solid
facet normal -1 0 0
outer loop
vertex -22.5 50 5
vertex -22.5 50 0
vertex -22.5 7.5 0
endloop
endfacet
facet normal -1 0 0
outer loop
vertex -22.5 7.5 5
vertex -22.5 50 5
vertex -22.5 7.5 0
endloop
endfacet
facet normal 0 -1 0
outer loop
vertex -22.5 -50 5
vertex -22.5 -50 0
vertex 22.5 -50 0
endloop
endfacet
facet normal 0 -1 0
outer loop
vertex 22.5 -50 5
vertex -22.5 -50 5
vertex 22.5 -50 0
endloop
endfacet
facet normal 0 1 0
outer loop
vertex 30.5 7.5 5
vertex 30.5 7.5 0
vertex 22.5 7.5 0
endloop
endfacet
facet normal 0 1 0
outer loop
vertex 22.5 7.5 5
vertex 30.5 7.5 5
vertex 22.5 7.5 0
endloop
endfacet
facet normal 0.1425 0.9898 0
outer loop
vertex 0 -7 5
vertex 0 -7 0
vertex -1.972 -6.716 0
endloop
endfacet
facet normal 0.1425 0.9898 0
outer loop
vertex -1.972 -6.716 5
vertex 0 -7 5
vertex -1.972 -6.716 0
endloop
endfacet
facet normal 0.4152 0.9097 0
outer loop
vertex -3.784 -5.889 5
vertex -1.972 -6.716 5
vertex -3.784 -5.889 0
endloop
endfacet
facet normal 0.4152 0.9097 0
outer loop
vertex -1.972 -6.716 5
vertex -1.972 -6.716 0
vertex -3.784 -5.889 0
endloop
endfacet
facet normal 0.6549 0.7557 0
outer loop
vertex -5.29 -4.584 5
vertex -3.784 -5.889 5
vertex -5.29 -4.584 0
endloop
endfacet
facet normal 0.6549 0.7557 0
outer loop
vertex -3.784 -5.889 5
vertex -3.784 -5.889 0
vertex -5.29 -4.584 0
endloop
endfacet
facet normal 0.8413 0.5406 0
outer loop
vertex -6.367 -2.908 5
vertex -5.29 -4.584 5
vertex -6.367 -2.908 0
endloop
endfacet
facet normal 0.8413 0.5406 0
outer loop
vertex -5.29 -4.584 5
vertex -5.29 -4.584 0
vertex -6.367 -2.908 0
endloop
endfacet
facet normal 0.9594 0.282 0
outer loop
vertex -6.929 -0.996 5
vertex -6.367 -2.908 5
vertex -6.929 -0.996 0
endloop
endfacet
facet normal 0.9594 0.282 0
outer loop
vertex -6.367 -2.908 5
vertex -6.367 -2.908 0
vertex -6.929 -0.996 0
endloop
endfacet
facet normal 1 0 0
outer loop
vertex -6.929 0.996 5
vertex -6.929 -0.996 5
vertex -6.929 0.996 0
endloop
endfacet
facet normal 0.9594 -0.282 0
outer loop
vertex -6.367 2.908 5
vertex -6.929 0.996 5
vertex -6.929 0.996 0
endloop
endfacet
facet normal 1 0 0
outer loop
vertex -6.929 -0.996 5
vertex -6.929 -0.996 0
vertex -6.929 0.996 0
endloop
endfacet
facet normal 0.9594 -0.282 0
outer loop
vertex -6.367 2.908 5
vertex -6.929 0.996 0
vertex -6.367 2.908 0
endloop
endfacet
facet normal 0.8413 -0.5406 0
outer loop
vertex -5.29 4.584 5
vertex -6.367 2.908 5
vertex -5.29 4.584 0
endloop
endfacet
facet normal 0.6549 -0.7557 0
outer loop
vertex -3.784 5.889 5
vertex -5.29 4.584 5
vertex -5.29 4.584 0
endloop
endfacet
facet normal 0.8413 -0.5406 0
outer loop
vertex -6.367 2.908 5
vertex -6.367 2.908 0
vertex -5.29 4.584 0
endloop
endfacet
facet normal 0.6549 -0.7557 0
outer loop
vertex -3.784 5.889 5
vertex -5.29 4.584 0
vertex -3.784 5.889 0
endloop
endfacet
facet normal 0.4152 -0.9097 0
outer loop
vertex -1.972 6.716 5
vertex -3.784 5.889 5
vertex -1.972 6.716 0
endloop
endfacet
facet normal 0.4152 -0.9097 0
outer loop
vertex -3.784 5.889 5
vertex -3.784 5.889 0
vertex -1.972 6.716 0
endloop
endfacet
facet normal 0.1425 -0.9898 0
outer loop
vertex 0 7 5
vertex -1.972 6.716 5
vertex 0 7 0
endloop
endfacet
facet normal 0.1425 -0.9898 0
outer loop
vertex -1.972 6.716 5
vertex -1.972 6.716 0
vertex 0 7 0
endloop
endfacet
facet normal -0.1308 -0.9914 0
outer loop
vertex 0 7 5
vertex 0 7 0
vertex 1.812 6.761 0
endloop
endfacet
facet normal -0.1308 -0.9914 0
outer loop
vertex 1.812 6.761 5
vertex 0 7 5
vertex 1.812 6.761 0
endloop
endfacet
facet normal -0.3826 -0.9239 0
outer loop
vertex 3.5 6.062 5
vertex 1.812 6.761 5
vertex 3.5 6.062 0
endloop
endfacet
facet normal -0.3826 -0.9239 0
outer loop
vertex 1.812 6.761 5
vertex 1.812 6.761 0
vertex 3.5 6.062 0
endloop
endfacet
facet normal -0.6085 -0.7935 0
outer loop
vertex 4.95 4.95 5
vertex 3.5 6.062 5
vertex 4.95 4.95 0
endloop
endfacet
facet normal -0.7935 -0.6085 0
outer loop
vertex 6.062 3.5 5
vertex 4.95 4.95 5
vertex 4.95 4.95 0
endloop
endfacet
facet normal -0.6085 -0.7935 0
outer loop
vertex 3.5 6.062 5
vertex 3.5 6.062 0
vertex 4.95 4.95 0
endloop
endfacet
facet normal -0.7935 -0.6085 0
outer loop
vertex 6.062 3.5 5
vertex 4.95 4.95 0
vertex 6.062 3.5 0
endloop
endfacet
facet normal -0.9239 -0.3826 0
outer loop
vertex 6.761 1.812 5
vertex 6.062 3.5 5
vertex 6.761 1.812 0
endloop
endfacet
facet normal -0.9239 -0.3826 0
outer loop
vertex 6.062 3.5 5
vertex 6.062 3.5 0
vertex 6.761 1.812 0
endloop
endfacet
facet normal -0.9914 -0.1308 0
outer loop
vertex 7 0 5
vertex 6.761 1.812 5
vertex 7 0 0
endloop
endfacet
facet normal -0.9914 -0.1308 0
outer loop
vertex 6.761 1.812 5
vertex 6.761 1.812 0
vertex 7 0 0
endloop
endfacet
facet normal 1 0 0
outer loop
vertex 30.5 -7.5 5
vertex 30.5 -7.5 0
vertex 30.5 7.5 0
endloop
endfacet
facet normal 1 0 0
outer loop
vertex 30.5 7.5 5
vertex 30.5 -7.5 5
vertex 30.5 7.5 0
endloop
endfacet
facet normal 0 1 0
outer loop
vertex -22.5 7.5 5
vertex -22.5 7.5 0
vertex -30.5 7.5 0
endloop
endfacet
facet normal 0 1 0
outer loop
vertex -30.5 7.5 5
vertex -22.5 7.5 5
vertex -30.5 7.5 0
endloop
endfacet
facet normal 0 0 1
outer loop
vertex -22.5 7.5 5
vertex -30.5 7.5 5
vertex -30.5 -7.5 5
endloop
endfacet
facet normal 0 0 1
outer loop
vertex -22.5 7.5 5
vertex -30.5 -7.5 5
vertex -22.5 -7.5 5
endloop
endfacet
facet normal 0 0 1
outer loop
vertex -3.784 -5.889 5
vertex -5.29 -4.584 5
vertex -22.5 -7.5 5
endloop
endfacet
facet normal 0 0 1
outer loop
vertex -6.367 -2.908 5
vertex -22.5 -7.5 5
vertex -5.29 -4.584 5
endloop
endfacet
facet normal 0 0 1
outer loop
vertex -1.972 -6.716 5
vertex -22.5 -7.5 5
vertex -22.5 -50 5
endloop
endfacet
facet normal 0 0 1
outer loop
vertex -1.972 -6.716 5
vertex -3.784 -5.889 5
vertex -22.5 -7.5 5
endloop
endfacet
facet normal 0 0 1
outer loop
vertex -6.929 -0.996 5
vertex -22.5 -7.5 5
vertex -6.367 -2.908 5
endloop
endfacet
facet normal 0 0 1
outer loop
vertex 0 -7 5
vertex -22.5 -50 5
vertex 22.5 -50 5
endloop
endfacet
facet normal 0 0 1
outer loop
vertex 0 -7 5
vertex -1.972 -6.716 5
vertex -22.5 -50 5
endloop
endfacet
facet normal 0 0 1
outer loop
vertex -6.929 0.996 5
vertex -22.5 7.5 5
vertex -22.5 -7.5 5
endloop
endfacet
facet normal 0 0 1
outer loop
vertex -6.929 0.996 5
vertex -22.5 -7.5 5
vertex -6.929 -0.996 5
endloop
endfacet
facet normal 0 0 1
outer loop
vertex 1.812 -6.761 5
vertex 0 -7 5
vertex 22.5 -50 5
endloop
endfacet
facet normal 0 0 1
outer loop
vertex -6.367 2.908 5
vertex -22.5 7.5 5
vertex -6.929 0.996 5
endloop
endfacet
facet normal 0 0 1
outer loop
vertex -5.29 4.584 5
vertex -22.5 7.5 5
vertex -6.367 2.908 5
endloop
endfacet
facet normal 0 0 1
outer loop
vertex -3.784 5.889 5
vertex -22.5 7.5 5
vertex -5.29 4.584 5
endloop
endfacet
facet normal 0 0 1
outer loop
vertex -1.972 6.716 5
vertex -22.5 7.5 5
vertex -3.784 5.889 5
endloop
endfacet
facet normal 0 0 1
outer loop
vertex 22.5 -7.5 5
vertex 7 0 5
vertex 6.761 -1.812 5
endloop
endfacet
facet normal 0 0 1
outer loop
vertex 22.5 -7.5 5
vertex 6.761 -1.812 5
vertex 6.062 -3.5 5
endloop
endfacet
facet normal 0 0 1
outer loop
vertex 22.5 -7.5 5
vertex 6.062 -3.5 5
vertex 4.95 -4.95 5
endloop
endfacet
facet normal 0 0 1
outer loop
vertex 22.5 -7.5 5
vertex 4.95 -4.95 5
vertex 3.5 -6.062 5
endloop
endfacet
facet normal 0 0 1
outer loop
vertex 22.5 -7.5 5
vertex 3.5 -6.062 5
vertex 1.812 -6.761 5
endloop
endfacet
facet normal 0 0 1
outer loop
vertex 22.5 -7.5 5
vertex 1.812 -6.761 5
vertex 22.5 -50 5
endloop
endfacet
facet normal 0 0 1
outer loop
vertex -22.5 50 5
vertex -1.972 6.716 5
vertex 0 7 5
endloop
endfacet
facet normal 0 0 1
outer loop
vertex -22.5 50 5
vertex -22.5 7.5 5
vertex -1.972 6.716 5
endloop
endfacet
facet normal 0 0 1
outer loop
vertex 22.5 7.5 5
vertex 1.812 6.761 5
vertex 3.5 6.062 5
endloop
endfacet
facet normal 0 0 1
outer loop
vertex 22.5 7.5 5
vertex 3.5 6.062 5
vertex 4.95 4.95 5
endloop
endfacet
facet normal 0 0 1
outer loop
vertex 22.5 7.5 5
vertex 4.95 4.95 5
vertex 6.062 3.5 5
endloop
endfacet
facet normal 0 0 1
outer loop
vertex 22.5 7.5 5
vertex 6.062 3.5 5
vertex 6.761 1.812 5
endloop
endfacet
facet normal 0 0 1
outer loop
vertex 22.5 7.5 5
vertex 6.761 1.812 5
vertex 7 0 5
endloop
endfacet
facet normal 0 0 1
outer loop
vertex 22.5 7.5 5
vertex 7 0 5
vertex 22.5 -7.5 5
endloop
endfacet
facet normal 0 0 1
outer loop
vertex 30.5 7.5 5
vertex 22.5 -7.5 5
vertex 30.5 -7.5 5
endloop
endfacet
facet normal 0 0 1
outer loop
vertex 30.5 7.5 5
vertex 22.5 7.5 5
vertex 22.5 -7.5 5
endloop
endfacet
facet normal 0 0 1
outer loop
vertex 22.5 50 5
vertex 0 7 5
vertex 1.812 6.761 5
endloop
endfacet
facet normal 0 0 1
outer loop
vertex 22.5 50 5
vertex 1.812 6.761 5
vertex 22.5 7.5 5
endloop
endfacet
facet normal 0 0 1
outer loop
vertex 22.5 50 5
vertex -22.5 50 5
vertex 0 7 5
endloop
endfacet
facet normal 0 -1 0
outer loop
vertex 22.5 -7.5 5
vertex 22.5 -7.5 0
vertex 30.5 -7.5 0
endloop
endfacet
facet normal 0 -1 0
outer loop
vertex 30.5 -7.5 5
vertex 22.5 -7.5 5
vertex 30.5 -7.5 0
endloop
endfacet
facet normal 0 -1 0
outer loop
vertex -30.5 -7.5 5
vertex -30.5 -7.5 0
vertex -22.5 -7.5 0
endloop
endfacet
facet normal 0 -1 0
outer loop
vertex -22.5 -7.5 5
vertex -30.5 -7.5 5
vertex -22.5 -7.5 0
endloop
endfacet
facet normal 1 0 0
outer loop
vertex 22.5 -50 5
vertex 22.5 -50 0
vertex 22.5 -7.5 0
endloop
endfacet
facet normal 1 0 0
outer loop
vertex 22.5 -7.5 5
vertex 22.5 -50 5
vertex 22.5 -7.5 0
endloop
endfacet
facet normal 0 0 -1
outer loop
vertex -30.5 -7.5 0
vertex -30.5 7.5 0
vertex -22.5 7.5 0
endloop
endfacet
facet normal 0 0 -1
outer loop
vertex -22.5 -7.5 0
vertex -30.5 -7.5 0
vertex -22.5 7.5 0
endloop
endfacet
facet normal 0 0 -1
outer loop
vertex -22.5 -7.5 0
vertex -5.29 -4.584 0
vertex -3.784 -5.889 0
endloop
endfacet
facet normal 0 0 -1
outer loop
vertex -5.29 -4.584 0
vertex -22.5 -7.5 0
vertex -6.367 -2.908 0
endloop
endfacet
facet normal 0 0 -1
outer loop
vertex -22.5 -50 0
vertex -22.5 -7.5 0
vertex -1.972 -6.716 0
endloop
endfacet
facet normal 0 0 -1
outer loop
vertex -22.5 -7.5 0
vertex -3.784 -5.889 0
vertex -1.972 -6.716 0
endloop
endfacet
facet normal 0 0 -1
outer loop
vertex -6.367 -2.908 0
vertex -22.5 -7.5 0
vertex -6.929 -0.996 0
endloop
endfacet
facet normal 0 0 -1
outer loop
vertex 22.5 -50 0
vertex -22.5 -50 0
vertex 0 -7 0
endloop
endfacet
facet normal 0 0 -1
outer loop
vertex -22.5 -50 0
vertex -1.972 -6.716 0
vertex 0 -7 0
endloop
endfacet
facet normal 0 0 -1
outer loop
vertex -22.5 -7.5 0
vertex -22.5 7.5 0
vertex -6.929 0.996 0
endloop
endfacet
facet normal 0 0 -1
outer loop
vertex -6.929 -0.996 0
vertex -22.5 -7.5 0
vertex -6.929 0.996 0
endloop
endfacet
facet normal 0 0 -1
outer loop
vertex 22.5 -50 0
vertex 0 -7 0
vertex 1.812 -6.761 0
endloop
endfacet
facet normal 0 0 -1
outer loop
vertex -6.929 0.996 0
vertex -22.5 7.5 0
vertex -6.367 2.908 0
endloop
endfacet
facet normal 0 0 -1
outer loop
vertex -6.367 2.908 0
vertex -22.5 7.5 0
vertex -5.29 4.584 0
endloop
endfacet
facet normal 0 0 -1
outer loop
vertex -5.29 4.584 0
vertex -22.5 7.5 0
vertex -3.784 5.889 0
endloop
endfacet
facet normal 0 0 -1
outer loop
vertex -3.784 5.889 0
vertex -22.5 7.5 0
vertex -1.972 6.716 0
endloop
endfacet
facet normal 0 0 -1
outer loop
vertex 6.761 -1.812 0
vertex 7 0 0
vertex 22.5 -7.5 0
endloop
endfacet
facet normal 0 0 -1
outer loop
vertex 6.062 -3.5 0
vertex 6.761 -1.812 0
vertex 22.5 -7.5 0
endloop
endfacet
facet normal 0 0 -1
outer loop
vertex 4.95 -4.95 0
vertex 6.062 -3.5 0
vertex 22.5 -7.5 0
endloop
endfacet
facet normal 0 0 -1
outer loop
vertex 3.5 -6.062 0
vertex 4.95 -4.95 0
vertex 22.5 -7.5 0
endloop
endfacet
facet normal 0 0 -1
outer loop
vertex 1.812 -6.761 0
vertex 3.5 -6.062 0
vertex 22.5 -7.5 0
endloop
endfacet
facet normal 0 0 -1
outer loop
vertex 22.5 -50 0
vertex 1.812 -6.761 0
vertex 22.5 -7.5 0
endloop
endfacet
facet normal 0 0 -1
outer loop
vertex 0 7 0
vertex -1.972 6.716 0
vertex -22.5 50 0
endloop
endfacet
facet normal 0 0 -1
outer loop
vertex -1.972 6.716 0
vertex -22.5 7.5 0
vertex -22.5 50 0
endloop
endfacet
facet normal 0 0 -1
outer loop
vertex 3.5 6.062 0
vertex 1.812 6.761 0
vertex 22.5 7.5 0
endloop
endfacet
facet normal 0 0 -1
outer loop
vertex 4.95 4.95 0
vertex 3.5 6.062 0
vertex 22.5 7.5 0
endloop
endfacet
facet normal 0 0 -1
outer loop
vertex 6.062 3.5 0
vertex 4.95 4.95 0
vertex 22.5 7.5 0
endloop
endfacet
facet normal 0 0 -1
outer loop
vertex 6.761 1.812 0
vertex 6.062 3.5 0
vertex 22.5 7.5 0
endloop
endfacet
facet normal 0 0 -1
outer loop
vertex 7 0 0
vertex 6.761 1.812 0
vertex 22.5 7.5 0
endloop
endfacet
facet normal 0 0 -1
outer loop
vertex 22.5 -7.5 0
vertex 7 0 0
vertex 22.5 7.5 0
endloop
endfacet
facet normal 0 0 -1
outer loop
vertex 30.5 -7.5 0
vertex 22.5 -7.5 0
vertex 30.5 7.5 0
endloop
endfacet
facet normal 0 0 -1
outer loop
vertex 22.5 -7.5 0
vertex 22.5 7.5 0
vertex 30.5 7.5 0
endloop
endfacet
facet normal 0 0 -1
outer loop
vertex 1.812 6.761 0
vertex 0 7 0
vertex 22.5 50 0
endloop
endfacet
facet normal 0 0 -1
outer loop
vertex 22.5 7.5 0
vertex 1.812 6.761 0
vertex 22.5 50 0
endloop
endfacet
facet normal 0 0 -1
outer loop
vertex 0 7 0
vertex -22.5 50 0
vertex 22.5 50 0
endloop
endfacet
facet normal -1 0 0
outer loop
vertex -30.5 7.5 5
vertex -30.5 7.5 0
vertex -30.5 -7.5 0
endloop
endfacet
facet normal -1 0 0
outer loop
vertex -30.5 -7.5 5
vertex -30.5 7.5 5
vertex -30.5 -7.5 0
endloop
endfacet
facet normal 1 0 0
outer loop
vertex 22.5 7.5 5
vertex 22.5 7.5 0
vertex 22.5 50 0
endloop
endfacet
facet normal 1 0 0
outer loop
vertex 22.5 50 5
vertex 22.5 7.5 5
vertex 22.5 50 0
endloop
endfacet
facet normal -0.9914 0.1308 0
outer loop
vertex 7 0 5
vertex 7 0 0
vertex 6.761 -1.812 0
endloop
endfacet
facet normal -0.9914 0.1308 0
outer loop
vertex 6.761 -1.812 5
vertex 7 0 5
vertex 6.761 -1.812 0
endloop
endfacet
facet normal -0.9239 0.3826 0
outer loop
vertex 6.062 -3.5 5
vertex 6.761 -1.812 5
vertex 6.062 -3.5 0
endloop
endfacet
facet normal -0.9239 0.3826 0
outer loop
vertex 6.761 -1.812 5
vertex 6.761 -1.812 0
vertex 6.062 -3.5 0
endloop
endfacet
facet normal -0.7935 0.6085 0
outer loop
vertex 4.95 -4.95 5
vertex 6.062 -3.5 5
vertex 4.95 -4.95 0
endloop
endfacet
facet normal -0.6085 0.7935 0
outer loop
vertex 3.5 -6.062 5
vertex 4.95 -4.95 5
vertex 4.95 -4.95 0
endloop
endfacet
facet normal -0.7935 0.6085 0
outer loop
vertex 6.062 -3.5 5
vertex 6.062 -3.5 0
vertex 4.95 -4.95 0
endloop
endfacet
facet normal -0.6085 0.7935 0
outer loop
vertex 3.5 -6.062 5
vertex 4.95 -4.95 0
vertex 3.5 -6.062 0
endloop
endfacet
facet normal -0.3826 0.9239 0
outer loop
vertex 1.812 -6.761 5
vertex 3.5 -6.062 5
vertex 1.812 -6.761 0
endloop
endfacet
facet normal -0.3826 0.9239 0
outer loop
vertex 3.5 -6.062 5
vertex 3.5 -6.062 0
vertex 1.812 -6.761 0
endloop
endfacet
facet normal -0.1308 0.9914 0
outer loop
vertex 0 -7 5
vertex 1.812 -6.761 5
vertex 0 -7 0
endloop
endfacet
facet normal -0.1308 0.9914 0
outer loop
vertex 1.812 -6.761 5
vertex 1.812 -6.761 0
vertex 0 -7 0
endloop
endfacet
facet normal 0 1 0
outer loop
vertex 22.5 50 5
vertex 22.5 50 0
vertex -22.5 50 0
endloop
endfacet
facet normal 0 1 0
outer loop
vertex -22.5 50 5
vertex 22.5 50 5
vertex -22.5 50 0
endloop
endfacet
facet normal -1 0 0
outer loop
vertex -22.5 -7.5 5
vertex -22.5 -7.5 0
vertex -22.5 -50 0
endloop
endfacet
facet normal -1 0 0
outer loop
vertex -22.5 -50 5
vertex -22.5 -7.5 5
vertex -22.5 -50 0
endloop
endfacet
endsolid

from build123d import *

# Parameters (mm, degrees)
F1_DEPTH = 5


with BuildPart() as f1:
    # F0 (on Top) → F1 (new body)
    with BuildSketch(Plane.XY):
        with BuildLine():
            Line((-22.5, 7.5), (-30.5, 7.5))
            Line((-30.5, 7.5), (-30.5, -7.5))
            Line((-30.5, -7.5), (-22.5, -7.5))
            Line((-22.5, -7.5), (-22.5, -50))
            Line((-22.5, -50), (0, -50))
            Line((0, -50), (0, -7))
            ThreePointArc((0, -7), (-7, 0), (0, 7))
            Line((0, 7), (0, 50))
            Line((0, 50), (-22.5, 50))
            Line((-22.5, 50), (-22.5, 7.5))
        make_face()
        with BuildLine():
            Line((22.5, 50), (0, 50))
            Line((0, 50), (0, 7))
            ThreePointArc((0, 7), (4.949747, 4.949747), (7, 0))
            ThreePointArc((7, 0), (4.949747, -4.949747), (0, -7))
            Line((0, -7), (0, -50))
            Line((0, -50), (22.5, -50))
            Line((22.5, -50), (22.5, -7.5))
            Line((22.5, -7.5), (30.5, -7.5))
            Line((30.5, -7.5), (30.5, 7.5))
            Line((30.5, 7.5), (22.5, 7.5))
            Line((22.5, 7.5), (22.5, 50))
        make_face()
    extrude(amount=F1_DEPTH)


solid = f1.part
